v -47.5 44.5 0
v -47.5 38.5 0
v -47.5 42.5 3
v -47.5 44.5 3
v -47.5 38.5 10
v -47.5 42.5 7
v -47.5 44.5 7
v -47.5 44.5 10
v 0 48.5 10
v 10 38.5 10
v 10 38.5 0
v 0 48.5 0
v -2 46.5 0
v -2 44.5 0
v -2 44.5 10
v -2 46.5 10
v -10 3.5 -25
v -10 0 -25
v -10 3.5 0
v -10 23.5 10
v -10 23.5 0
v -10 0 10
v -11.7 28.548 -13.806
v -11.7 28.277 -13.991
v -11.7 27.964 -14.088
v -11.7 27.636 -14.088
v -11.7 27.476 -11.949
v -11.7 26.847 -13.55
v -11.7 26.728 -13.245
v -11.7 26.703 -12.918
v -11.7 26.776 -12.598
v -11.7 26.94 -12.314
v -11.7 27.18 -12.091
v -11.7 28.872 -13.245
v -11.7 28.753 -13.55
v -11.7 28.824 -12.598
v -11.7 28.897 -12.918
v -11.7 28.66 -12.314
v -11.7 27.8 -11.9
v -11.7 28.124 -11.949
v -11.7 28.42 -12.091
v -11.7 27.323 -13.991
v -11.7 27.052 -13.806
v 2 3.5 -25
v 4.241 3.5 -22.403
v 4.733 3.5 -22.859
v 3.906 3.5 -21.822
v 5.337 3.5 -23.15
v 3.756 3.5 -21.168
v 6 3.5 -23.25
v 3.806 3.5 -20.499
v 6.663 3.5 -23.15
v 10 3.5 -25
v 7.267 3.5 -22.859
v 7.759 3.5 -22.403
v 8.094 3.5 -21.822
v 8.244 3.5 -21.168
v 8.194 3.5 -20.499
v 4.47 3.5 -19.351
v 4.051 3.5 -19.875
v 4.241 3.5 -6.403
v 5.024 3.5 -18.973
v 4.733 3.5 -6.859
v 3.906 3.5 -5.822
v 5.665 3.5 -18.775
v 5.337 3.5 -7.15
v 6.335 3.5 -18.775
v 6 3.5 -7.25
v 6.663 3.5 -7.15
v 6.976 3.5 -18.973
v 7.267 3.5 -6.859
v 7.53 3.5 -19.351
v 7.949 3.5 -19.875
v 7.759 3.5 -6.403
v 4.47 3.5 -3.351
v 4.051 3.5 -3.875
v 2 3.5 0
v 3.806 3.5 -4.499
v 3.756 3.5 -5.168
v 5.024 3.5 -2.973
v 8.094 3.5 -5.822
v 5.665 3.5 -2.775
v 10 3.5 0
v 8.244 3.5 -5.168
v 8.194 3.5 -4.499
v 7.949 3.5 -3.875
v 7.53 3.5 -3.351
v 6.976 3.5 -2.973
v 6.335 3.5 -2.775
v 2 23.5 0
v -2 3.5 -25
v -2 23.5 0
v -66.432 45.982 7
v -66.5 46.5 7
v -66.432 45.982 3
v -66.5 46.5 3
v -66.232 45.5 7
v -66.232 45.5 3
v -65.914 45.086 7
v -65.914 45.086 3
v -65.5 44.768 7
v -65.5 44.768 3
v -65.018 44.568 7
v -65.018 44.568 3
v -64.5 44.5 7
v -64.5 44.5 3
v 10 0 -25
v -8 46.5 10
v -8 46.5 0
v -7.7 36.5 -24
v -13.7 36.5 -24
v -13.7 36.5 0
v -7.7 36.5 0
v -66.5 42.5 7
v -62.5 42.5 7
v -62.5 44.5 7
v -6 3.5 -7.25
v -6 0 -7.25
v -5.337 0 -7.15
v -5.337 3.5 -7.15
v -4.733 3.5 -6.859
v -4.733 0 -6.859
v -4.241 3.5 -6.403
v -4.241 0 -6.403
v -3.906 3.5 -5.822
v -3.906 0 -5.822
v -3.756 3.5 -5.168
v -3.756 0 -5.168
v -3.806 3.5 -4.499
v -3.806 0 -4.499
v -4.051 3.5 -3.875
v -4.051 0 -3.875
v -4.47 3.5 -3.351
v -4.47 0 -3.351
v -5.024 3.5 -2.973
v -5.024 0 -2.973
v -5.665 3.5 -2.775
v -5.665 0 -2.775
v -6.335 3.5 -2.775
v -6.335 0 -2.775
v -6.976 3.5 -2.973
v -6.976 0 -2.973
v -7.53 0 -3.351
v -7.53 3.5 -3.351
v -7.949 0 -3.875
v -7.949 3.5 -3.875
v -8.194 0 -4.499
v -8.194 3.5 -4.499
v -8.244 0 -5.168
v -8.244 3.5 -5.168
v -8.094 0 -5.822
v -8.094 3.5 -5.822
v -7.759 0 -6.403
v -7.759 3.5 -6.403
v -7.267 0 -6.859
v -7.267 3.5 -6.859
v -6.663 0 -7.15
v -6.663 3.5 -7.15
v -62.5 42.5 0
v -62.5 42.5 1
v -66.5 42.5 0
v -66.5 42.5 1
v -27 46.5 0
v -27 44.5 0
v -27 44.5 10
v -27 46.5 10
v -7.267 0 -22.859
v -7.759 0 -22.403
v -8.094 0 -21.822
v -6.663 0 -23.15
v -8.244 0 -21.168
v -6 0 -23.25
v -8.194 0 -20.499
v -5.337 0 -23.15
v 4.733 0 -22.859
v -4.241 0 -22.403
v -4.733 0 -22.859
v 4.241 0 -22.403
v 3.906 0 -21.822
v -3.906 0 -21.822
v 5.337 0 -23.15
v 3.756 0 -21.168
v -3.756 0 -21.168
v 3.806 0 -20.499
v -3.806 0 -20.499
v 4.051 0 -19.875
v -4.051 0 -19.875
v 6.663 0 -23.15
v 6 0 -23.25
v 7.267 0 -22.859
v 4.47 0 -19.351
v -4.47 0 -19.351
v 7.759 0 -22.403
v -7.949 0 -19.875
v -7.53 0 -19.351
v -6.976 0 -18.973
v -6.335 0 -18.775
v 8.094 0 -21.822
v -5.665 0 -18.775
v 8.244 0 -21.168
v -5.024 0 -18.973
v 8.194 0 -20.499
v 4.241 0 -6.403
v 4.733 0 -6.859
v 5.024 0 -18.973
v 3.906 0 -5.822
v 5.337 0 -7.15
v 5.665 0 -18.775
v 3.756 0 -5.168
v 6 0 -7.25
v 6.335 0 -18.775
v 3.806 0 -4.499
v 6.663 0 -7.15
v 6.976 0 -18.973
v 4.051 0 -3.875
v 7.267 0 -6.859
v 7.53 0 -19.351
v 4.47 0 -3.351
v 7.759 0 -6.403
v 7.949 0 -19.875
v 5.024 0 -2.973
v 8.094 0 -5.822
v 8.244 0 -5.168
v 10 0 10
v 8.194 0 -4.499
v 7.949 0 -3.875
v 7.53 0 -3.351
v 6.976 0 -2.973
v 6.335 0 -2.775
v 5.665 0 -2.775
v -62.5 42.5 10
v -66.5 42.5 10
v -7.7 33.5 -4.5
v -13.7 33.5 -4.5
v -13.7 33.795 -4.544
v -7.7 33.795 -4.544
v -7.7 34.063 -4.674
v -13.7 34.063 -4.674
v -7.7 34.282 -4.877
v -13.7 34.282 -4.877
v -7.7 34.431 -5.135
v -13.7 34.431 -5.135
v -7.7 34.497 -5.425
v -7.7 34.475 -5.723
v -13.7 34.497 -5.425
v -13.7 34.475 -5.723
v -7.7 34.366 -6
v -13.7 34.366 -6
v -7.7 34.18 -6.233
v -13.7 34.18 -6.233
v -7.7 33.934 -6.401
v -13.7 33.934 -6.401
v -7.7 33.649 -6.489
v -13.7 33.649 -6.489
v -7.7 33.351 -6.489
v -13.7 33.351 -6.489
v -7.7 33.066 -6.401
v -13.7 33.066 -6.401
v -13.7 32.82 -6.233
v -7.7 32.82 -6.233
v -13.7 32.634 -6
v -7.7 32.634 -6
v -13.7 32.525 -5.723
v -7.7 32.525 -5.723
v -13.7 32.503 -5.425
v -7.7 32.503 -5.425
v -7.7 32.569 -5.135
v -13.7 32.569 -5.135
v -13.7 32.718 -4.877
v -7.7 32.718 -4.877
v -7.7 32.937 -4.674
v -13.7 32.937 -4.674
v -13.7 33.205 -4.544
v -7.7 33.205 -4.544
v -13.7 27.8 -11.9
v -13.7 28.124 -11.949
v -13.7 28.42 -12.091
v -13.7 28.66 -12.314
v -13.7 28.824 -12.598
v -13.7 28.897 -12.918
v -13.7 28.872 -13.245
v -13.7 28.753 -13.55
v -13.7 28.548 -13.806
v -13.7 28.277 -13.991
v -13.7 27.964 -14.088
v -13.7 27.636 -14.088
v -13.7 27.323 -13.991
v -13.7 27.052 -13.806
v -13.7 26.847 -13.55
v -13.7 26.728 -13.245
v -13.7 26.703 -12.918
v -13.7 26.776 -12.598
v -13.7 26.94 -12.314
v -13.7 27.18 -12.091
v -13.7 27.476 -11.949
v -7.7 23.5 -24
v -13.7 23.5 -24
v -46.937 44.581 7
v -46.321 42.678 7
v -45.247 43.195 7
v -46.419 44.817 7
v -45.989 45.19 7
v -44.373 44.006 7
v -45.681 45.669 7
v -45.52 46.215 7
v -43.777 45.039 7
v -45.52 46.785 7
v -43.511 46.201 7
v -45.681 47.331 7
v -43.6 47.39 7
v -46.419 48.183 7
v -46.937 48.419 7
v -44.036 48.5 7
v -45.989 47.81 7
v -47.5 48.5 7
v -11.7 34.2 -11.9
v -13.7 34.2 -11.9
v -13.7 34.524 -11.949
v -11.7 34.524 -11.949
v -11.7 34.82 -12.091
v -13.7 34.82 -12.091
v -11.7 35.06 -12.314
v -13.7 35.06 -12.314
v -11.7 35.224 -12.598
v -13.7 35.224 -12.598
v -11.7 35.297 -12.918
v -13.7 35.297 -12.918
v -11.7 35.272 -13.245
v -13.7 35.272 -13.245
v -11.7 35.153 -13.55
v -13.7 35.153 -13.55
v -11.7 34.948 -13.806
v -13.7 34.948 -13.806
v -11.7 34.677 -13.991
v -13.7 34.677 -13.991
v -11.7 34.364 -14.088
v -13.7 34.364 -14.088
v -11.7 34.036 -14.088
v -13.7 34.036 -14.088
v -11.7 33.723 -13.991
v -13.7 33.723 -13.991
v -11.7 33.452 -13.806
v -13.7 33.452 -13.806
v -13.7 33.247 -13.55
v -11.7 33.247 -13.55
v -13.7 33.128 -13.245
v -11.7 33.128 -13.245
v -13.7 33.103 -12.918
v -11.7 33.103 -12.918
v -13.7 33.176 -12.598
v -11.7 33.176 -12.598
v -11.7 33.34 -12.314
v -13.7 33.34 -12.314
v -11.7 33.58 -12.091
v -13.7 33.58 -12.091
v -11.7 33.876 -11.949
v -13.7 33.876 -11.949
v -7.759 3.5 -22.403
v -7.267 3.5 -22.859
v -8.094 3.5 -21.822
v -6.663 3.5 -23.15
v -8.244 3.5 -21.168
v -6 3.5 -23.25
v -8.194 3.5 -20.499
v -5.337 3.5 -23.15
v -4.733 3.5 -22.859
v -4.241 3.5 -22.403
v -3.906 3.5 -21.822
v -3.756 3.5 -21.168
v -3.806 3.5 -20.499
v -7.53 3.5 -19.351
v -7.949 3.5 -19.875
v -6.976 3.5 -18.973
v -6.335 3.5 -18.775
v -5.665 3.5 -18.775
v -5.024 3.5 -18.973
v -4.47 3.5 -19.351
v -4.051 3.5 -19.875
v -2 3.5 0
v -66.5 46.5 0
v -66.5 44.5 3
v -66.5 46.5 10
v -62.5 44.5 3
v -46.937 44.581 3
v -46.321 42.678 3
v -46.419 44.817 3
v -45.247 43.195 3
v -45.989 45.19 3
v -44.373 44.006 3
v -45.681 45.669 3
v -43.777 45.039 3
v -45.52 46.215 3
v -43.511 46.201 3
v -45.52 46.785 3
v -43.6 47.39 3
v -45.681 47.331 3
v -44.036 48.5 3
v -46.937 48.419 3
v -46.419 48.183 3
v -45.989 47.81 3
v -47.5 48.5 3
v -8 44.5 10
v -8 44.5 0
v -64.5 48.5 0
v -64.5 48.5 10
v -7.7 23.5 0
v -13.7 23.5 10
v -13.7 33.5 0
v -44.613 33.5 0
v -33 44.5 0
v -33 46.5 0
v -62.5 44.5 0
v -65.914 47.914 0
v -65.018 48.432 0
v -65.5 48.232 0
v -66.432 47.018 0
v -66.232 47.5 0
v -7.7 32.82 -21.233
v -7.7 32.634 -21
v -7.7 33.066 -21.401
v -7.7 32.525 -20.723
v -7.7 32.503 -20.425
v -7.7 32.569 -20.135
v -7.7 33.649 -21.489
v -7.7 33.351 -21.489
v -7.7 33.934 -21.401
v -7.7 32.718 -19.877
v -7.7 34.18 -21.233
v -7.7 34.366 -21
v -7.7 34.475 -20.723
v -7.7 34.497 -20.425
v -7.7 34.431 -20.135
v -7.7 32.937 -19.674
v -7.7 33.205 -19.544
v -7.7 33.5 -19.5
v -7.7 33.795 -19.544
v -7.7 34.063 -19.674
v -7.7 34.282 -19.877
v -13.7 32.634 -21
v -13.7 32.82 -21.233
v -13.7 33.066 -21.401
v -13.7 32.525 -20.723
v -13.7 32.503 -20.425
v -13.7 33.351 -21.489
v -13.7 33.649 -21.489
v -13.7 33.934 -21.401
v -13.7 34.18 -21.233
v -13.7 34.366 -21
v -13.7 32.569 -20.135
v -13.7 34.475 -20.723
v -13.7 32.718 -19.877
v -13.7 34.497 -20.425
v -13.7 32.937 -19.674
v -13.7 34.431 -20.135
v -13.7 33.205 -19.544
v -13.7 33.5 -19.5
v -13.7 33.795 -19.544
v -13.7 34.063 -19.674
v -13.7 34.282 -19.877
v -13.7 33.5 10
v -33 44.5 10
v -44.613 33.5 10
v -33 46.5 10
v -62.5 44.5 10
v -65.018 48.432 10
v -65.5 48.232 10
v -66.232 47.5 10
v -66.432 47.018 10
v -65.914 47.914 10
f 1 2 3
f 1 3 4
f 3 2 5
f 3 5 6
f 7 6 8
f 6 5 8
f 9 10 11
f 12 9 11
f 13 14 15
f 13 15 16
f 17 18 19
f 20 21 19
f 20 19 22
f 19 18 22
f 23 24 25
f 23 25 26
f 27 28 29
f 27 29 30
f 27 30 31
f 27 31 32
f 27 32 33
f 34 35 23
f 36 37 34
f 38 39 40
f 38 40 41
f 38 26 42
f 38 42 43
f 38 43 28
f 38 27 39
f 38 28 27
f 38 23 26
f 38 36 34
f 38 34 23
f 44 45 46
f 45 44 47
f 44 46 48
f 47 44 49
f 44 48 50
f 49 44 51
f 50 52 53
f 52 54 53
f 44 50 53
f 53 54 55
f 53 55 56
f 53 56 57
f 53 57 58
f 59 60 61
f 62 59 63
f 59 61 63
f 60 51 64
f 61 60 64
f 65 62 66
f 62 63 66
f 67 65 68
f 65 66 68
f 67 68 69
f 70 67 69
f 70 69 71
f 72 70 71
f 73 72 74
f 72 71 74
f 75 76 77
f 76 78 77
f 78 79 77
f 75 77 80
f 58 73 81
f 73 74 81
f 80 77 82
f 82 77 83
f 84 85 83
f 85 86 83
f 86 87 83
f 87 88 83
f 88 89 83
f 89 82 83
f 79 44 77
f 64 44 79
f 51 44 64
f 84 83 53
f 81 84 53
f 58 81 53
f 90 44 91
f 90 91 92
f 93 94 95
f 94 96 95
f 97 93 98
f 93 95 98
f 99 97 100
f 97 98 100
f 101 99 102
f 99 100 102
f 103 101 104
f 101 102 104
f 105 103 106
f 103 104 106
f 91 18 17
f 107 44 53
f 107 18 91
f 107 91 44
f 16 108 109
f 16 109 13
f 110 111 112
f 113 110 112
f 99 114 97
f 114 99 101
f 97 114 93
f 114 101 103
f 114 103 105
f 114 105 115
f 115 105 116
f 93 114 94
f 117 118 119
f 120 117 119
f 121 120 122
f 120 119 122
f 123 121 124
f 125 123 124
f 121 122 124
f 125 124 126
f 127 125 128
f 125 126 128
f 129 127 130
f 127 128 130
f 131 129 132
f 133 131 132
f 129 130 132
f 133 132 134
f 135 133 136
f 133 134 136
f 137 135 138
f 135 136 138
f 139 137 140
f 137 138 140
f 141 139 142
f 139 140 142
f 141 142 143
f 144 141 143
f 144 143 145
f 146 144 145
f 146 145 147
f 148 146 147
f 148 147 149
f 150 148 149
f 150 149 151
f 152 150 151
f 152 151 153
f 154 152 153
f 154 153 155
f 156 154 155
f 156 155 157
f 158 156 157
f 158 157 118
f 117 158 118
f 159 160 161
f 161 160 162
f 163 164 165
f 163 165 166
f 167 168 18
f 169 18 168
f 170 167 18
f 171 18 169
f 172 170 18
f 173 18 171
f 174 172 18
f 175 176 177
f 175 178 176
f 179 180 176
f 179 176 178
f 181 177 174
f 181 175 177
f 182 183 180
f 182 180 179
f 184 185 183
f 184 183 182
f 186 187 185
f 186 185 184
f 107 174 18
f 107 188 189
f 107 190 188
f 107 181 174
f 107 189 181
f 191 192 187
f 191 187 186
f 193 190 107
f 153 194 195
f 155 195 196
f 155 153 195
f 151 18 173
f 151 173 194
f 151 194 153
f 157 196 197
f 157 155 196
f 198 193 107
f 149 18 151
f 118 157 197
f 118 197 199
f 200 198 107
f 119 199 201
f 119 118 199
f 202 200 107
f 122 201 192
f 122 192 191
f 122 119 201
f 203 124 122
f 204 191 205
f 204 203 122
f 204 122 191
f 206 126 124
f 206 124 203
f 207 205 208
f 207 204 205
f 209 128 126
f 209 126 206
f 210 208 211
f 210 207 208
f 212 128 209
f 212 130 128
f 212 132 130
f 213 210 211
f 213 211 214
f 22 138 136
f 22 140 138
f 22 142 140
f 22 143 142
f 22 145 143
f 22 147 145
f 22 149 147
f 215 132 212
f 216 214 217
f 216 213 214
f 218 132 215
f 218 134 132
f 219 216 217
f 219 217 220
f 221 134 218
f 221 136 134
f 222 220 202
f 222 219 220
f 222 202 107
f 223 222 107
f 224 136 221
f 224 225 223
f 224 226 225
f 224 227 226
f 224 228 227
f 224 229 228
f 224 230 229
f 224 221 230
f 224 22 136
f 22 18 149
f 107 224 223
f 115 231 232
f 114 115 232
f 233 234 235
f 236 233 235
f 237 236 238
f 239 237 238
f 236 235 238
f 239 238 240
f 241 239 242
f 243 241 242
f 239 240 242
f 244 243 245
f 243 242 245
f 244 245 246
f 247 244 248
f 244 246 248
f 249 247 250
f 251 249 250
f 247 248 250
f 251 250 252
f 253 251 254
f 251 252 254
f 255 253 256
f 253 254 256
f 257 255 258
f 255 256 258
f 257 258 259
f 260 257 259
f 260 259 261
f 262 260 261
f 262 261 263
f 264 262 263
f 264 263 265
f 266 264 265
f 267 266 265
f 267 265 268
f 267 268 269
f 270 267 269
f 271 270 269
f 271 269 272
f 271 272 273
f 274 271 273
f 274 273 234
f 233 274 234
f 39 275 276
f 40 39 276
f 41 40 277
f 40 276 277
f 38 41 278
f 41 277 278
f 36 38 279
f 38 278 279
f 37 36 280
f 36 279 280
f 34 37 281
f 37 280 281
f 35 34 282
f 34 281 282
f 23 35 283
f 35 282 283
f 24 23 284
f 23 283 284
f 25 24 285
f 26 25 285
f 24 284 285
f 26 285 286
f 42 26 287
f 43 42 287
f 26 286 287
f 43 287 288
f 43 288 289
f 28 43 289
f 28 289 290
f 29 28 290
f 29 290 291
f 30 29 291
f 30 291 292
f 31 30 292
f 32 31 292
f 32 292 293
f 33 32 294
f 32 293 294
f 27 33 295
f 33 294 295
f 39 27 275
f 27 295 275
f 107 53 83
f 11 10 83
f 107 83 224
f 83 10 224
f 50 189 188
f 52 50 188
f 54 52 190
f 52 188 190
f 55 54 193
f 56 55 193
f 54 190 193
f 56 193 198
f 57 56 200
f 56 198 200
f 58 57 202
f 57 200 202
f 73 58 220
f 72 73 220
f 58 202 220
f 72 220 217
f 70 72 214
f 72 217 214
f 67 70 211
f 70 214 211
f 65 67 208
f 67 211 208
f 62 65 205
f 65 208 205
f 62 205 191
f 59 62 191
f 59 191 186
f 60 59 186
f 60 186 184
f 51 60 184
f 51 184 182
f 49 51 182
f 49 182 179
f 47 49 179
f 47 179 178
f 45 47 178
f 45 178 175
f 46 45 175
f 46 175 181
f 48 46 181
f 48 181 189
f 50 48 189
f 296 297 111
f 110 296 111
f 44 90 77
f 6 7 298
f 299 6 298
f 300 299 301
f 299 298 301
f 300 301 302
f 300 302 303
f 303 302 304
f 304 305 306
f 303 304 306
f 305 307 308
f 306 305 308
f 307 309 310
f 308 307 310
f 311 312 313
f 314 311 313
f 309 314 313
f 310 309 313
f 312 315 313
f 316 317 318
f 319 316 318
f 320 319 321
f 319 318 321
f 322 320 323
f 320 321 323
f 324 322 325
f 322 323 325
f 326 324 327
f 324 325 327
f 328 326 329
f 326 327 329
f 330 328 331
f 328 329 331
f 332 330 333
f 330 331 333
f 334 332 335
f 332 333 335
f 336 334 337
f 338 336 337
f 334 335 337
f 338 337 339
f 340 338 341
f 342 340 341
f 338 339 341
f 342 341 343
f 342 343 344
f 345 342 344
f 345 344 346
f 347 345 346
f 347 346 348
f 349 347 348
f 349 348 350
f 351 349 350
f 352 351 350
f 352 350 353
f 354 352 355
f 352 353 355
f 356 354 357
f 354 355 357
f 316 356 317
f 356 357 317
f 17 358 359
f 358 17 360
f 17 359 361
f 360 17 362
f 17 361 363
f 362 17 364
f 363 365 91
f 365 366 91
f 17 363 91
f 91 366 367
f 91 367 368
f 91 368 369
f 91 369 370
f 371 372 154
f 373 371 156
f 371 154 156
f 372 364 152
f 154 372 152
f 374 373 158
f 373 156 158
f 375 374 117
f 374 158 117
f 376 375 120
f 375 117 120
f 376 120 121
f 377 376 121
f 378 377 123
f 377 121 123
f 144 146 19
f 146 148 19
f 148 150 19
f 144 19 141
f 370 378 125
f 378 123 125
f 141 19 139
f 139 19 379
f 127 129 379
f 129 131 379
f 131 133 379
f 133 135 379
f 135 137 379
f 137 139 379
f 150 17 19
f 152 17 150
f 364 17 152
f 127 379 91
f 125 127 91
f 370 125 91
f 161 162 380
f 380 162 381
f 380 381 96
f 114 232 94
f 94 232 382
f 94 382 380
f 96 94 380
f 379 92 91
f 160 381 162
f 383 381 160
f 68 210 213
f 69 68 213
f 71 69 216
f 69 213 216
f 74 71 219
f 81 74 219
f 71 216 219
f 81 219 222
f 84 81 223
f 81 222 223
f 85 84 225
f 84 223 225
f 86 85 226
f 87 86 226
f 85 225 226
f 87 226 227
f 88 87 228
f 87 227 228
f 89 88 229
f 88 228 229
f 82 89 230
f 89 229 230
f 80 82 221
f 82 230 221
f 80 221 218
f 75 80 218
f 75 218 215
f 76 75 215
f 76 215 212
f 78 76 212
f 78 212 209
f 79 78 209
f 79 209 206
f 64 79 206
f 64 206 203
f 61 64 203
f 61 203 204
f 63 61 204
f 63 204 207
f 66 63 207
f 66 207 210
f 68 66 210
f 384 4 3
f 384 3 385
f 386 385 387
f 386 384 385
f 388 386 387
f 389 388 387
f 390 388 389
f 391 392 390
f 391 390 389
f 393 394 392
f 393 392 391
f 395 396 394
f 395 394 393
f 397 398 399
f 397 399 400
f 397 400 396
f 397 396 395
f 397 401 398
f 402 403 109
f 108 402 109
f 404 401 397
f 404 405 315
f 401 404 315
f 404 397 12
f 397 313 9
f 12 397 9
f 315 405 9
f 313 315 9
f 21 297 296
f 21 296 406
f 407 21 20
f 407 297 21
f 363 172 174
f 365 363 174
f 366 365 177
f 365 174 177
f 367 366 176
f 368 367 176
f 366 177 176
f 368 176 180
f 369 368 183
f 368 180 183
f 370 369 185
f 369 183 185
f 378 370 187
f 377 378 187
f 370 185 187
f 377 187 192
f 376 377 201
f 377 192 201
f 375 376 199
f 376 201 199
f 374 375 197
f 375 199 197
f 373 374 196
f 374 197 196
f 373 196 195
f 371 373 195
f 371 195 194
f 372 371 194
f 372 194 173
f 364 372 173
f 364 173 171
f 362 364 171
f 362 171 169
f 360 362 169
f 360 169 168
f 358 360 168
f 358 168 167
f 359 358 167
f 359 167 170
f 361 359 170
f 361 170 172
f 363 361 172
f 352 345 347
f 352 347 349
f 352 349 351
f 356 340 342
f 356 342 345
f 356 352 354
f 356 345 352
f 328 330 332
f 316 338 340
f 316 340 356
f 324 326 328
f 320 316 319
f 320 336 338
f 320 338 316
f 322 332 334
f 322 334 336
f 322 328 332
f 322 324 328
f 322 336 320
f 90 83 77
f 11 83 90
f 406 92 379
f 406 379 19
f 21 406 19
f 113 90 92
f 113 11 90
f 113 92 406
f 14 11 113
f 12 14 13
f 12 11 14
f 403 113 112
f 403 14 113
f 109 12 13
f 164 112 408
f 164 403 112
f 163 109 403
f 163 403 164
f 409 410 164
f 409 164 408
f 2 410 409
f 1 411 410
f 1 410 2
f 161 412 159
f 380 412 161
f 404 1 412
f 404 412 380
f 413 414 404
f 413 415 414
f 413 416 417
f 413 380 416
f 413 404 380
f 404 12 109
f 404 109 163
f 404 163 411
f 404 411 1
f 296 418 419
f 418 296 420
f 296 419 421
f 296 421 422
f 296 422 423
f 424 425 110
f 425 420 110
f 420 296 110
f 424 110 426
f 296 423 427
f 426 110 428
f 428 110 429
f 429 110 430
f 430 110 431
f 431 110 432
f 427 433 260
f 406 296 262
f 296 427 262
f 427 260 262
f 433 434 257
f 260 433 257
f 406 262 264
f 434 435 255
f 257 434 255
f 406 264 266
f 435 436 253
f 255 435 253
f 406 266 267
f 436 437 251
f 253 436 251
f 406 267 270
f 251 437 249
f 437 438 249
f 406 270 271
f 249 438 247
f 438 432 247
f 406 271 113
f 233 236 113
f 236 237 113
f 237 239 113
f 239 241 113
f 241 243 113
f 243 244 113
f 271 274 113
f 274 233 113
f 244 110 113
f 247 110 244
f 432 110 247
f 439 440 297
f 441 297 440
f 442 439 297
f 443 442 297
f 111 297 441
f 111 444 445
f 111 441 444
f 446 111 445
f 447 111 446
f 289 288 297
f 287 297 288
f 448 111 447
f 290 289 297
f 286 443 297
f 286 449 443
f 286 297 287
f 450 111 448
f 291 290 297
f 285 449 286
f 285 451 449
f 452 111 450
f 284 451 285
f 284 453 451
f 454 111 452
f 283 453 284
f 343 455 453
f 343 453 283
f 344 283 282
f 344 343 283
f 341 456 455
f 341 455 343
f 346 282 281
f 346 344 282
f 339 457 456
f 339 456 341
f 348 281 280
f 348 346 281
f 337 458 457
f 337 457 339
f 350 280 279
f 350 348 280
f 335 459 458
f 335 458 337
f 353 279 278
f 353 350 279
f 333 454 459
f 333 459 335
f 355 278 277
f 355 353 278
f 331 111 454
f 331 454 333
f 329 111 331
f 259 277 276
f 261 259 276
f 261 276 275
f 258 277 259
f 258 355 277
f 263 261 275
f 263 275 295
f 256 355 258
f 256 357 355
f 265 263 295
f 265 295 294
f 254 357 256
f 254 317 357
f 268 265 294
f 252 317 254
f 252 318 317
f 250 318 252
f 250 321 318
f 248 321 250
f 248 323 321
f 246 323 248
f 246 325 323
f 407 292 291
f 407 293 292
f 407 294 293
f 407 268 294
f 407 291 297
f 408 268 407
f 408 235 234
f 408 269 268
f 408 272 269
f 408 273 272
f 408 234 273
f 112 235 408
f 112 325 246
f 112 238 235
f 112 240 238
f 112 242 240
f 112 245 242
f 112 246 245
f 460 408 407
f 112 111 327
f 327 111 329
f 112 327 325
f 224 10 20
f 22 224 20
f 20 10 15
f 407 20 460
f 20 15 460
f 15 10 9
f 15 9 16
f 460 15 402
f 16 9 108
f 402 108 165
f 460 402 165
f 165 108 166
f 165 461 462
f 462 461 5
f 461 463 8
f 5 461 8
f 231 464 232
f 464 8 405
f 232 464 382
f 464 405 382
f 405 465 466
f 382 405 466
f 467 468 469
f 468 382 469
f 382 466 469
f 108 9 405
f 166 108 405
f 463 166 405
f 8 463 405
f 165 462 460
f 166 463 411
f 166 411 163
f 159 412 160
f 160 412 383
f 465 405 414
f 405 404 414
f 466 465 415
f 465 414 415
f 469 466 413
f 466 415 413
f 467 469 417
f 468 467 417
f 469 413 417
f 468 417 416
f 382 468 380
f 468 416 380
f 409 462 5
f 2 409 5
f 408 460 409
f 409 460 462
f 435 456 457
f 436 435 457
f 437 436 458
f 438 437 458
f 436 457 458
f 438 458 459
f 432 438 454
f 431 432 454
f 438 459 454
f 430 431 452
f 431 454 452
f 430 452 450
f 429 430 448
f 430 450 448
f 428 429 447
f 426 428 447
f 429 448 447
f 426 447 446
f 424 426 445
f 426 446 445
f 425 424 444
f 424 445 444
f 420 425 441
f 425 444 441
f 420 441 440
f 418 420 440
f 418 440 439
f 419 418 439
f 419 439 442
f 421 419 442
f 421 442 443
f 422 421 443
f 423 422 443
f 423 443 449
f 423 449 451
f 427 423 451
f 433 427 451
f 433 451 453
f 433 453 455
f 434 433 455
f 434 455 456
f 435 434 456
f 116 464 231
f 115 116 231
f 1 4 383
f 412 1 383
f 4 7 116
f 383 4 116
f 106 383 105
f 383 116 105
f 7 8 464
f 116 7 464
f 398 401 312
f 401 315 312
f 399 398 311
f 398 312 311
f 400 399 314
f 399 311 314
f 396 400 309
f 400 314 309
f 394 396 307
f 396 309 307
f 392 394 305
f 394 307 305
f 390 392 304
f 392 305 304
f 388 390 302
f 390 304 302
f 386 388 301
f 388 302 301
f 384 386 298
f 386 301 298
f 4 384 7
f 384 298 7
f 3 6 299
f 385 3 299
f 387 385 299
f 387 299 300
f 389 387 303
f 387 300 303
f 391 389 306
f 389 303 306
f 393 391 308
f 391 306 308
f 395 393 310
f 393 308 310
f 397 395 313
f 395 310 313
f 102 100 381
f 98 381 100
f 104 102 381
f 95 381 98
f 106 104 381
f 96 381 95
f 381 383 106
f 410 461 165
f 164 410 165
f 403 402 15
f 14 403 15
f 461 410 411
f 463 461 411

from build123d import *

# Parameters (mm, degrees)
BOSS_EXTRUDE1_DEPTH = 10
SKETCH6_W           = 20
SKETCH6_H           = 25
BOSS_EXTRUDE3_DEPTH = 3.5
SKETCH8_R           = 2.25
CUT_EXTRUDE2_DEPTH  = 47.313496953
SKETCH9_W           = 24
SKETCH9_H           = 13
BOSS_EXTRUDE4_DEPTH = 6
SKETCH10_R          = 1.1
CUT_EXTRUDE3_DEPTH  = 2
SKETCH11_R          = 1
CUT_EXTRUDE4_DEPTH  = 51.189042629
SKETCH12_W          = 6
SKETCH12_H          = 2
BOSS_EXTRUDE5_DEPTH = 10
SKETCH14_W          = 4
SKETCH14_H          = 2
CUT_EXTRUDE5_DEPTH  = 2
BOSS_EXTRUDE6_DEPTH = 2
FILLET1_R           = 2
CHAMFER1_SIZE       = 2
CHAMFER2_SIZE       = 10


with BuildPart() as part:
    # Sketch1 → Boss-Extrude1 (new body)
    with BuildSketch(Plane.XY):
        Polygon((-13.7, 36.5), (-13.7, 23.5), (-10, 23.5), (-10, 0), (10, 0), (10, 36.5), align=None)
    extrude(amount=BOSS_EXTRUDE1_DEPTH)

    # Sketch6 → Boss-Extrude3 (add)
    with BuildSketch(Plane.XZ):
        with Locations((0, -12.5)):
            Rectangle(SKETCH6_W, SKETCH6_H)
    extrude(amount=-BOSS_EXTRUDE3_DEPTH)

    # Sketch8 → Cut-Extrude2 (cut, through all)
    with BuildSketch(Plane.XZ):
        with Locations(Location((-6, -5, 0), (0, 0, 270))):
            Circle(SKETCH8_R)
        with Locations(Location((6, -5, 0), (0, 0, 270))):
            Circle(SKETCH8_R)
        with Locations(Location((6, -21, 0), (0, 0, 270))):
            Circle(SKETCH8_R)
        with Locations(Location((-6, -21, 0), (0, 0, 270))):
            Circle(SKETCH8_R)
    extrude(amount=-CUT_EXTRUDE2_DEPTH, mode=Mode.SUBTRACT)

    # Sketch9 → Boss-Extrude4 (add)
    with BuildSketch(Plane.ZY.offset(13.7)):
        with Locations((-12, 30)):
            Rectangle(SKETCH9_W, SKETCH9_H)
    extrude(amount=-BOSS_EXTRUDE4_DEPTH)

    # Sketch10 → Cut-Extrude3 (cut)
    with BuildSketch(Plane.ZY.offset(13.7)):
        with Locations((-13, 34.2)):
            Circle(SKETCH10_R)
        with Locations((-13, 27.8)):
            Circle(SKETCH10_R)
    extrude(amount=-CUT_EXTRUDE3_DEPTH, mode=Mode.SUBTRACT)

    # Sketch11 → Cut-Extrude4 (cut, through all)
    with BuildSketch(Plane.ZY.offset(13.7)):
        with Locations((-20.5, 33.5)):
            Circle(SKETCH11_R)
        with Locations((-5.5, 33.5)):
            Circle(SKETCH11_R)
    extrude(amount=-CUT_EXTRUDE4_DEPTH, mode=Mode.SUBTRACT)

    # Sketch12 → Boss-Extrude5 (add)
    with BuildSketch(Plane.XY.offset(10)):
        Polygon((10, 36.5), (-13.7, 36.5), (-13.7, 33.5), (-44.613248654, 33.5), (-47.5, 38.5), (-47.5, 44.5), (-62.5, 44.5), (-62.5, 42.5), (-66.5, 42.5), (-66.5, 48.5), (10, 48.5), align=None)
        with Locations((-30, 45.5)):
            Rectangle(SKETCH12_W, SKETCH12_H, mode=Mode.SUBTRACT)
        with Locations((-5, 45.5)):
            Rectangle(SKETCH12_W, SKETCH12_H, mode=Mode.SUBTRACT)
    extrude(amount=-BOSS_EXTRUDE5_DEPTH)

    # Sketch14 → Cut-Extrude5 (cut, symmetric)
    with BuildSketch(Plane.XY.offset(5)):
        with Locations((-64.5, 43.5)):
            Rectangle(SKETCH14_W, SKETCH14_H)
        with BuildLine():
            Line((-47.5, 44.5), (-47.5, 42.5))
            ThreePointArc((-47.5, 42.5), (-44.035898385, 44.5), (-44.035898385, 48.5))
            Line((-44.035898385, 48.5), (-47.5, 48.5))
            ThreePointArc((-47.5, 48.5), (-45.5, 46.5), (-47.5, 44.5))
        make_face()
    extrude(amount=CUT_EXTRUDE5_DEPTH, both=True, mode=Mode.SUBTRACT)

    # Sketch15 → Boss-Extrude6 (add, symmetric)
    with BuildSketch(Plane(origin=(0, 0, 0), x_dir=(0, 0, -1), z_dir=(1, 0, 0))):
        Polygon((0, 3.5), (25, 3.5), (0, 23.5), align=None)
    extrude(amount=BOSS_EXTRUDE6_DEPTH, both=True)

    # Fillet1
    fillet1_edges = [part.edges().sort_by_distance(p)[0] for p in [
        (-66.5, 44.5, 5),
        (-66.5, 48.5, 5),
    ]]
    fillet(fillet1_edges, radius=FILLET1_R - 0.0001)  # a hair under: the kernel refuses the full size

    # Chamfer1
    chamfer1_edges = [part.edges().sort_by_distance(p)[0] for p in [
        (-64.5, 42.5, 3),
    ]]
    chamfer(chamfer1_edges, length=CHAMFER1_SIZE - 0.0001)  # a hair under: the kernel refuses the full size

    # Chamfer2
    chamfer2_edges = [part.edges().sort_by_distance(p)[0] for p in [
        (10, 48.5, 5),
    ]]
    chamfer(chamfer2_edges, length=CHAMFER2_SIZE)


solid = part.part
